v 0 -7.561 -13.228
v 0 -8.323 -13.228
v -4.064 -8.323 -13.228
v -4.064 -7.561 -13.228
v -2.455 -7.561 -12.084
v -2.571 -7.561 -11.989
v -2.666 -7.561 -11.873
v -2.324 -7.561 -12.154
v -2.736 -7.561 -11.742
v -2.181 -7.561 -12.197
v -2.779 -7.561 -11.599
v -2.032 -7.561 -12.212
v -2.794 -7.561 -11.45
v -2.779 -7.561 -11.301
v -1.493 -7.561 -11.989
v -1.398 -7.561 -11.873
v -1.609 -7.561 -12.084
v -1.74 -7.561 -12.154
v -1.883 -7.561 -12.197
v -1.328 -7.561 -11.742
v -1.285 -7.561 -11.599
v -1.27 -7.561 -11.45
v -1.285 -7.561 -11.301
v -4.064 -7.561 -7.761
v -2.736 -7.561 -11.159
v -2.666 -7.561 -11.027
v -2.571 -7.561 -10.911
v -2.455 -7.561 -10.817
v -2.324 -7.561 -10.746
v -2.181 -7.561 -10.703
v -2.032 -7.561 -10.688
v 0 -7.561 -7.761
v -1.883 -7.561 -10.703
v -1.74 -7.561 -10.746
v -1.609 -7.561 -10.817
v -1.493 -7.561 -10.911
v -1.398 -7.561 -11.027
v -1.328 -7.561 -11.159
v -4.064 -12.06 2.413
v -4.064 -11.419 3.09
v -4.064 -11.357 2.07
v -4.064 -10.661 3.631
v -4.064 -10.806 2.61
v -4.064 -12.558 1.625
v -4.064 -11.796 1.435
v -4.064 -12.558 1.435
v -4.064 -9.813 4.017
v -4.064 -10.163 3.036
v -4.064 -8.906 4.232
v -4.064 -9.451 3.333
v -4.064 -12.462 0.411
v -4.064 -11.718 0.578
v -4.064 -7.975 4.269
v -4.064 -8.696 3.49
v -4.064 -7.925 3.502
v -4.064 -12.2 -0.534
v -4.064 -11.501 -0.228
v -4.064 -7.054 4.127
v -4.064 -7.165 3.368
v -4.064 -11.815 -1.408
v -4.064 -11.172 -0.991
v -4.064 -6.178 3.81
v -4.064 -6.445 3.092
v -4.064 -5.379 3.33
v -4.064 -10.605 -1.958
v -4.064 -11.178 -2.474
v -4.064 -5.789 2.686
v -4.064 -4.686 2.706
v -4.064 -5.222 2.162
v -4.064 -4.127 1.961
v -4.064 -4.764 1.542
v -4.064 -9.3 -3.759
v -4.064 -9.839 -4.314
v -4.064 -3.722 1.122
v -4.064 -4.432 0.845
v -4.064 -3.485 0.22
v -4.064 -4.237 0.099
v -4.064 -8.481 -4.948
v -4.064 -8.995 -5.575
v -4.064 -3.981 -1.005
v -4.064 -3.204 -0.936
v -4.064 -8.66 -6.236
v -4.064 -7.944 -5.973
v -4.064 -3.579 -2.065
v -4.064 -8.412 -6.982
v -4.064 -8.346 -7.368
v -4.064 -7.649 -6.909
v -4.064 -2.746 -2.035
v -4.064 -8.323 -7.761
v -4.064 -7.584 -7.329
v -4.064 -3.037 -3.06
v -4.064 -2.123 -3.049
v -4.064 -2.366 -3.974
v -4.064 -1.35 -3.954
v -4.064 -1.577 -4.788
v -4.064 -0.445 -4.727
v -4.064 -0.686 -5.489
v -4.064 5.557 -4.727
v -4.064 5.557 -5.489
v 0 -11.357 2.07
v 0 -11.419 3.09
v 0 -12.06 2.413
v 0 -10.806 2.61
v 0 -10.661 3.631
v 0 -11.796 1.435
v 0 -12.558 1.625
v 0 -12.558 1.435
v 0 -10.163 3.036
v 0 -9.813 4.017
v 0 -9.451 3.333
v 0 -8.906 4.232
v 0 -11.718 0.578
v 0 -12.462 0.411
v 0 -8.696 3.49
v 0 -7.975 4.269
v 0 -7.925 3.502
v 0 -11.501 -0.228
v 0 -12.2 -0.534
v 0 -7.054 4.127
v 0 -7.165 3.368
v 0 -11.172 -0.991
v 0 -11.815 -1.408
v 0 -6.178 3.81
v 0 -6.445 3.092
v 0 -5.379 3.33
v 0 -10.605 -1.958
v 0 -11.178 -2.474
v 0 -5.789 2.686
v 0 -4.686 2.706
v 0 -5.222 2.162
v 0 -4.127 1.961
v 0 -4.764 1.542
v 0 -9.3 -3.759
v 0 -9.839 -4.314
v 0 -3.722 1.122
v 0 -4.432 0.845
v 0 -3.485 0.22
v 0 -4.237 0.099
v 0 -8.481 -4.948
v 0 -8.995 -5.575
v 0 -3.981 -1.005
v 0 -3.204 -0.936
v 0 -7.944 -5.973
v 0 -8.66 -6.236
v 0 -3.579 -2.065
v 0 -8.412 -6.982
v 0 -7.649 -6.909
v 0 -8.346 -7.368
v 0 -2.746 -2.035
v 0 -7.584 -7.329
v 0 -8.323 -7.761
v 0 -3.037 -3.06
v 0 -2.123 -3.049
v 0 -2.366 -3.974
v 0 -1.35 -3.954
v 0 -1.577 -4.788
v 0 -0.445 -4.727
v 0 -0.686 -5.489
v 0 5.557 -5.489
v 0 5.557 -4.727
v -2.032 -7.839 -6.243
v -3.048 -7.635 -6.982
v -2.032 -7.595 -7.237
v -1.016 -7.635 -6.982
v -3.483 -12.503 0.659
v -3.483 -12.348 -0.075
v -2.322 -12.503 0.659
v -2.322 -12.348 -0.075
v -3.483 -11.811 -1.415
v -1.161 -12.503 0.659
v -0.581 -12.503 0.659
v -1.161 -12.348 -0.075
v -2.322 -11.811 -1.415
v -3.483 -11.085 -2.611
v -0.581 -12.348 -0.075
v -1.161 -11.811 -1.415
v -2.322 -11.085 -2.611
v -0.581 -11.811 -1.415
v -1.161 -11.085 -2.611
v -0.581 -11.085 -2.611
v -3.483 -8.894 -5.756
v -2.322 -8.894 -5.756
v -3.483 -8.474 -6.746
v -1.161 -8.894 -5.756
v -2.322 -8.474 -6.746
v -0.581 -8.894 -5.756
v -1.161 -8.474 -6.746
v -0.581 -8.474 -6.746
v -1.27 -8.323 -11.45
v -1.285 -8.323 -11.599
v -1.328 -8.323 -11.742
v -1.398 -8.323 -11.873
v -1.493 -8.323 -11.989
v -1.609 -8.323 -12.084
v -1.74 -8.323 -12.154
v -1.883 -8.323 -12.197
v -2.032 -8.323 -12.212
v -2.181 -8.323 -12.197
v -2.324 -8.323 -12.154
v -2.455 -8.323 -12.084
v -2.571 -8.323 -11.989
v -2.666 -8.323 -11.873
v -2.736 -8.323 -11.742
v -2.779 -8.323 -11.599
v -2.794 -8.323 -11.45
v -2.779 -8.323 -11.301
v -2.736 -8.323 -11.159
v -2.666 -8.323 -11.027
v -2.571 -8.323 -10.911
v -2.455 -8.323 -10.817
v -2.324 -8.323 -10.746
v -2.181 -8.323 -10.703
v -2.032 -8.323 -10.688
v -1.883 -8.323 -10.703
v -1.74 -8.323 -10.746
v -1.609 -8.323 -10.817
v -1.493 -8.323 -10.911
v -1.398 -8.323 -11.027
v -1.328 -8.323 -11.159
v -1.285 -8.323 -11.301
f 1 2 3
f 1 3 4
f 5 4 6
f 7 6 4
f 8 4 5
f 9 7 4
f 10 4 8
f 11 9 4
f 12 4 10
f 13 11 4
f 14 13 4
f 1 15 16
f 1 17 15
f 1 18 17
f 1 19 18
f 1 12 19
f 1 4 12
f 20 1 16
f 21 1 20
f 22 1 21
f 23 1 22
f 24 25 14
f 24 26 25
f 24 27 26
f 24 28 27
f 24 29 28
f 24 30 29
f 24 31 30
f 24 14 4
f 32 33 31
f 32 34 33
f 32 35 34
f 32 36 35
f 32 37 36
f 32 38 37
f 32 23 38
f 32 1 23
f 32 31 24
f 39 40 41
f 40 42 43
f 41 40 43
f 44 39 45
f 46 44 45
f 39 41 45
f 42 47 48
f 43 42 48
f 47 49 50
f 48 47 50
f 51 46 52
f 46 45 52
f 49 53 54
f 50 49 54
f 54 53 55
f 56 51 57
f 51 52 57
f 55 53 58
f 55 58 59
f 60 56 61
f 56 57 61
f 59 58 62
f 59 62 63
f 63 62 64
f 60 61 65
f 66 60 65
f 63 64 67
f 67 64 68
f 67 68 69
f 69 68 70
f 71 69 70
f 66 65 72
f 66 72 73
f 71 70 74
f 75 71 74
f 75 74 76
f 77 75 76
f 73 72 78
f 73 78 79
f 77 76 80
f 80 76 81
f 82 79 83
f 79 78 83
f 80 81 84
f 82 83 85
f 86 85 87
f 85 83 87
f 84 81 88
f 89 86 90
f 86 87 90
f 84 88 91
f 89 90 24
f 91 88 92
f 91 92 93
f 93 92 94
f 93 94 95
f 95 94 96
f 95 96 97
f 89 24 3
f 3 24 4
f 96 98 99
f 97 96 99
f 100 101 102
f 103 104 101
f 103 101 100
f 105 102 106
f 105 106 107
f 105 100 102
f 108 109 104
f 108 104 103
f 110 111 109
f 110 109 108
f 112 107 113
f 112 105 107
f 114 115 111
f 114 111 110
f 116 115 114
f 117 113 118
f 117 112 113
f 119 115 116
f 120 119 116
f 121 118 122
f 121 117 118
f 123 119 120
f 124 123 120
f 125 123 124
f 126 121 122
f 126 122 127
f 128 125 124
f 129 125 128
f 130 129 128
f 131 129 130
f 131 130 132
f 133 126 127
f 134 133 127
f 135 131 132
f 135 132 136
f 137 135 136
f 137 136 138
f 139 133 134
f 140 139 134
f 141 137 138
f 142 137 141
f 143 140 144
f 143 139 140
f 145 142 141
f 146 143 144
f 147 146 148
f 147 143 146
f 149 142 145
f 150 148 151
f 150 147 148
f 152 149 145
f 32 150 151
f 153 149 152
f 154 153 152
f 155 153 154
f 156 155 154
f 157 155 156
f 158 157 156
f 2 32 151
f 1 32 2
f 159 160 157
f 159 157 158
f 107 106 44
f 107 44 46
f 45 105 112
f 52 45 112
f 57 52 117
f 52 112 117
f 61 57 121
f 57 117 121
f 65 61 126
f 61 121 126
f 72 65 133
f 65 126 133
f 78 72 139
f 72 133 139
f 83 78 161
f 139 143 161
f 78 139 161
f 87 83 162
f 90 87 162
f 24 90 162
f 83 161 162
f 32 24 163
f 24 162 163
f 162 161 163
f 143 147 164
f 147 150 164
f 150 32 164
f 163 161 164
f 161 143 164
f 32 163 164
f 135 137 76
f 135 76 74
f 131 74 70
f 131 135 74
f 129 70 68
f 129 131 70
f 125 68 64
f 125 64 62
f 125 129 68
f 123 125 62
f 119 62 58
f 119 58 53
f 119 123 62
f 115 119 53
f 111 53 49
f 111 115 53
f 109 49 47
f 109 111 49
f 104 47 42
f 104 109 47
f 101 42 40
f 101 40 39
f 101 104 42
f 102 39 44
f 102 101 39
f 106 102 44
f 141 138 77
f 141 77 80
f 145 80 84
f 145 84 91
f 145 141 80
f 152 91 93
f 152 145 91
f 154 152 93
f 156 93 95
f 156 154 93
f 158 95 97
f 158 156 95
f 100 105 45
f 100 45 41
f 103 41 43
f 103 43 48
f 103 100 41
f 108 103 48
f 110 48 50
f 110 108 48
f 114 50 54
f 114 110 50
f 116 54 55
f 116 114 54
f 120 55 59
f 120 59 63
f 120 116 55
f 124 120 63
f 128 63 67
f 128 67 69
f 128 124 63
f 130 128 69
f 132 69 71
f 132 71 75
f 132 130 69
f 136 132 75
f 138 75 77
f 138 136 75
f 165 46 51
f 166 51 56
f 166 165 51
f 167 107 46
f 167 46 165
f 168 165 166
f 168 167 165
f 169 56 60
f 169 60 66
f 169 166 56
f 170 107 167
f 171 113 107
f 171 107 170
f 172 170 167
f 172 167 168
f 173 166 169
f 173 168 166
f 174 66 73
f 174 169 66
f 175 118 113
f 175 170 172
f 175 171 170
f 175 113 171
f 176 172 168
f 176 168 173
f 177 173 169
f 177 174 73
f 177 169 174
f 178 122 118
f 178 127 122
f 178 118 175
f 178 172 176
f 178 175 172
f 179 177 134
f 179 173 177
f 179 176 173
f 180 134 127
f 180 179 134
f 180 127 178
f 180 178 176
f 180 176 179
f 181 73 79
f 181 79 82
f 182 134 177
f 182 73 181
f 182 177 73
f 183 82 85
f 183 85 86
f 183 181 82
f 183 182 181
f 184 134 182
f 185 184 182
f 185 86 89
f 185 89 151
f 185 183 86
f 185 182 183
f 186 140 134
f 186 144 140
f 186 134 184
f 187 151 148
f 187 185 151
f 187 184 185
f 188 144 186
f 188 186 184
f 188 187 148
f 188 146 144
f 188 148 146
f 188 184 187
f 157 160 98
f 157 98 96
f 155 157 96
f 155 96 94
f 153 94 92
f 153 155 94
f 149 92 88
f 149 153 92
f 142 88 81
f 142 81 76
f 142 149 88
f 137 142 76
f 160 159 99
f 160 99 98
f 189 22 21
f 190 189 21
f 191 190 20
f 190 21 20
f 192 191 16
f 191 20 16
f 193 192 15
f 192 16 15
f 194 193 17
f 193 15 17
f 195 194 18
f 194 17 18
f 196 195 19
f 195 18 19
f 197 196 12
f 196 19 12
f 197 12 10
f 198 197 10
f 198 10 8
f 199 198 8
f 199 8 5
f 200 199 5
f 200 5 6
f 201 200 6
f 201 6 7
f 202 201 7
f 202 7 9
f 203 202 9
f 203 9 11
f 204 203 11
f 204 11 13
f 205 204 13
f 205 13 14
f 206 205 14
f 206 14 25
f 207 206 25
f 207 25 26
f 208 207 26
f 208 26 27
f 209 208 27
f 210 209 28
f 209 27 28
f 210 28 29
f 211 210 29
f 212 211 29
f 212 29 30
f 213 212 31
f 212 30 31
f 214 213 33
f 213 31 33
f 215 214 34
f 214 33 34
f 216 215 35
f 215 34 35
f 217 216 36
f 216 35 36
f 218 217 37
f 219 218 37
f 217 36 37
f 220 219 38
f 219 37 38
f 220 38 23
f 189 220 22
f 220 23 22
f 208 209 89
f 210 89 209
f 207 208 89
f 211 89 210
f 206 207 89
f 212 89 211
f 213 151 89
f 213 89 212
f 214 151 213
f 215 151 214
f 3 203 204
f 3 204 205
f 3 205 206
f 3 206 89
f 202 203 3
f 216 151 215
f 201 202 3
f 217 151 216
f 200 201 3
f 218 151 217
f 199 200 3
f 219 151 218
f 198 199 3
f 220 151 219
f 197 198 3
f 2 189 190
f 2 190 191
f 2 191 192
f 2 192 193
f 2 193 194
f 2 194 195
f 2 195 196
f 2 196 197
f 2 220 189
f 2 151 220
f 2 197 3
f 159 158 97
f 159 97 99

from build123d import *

# Parameters (mm, degrees)
BOSS_EXTRUDE1_DEPTH = 4.064
SKETCH2_R           = 0.762
CUT_EXTRUDE1_DEPTH  = 5.996401933


with BuildPart() as part:
    # Sketch1 → Boss-Extrude1 (new body)
    with BuildSketch(Plane(origin=(0, 0, 0), x_dir=(0, 0, -1), z_dir=(1, 0, 0))):
        with BuildLine():
            Line((4.726865031, 5.556764983), (4.726865031, -0.444820699))
            ThreePointArc((4.726865031, -0.444820699), (2.554182799, -2.454658405), (-0.22039607, -3.485050462))
            ThreePointArc((-0.22039607, -3.485050462), (-4.22007249, -7.510942511), (-1.625042246, -12.557826332))
            Line((-1.625042246, -12.557826332), (-1.435472167, -12.557826332))
            add(Edge.make_bspline(
                [(-1.435472167, -12.557826332), (-1.175924208, -12.557849399), (-0.648911083, -12.519392405), (0.32614537, -12.308921718), (1.440239513, -11.841665003), (2.626862444, -11.096563597), (4.080334858, -10.011065793), (5.769221033, -8.746934213), (7.066078237, -8.323424357), (7.761067398, -8.323424519)],
                knots=[0, 0, 0, 0, 0.054765757, 0.109531513, 0.219063026, 0.328594539, 0.438126053, 0.657189079, 0.876252105, 0.876252105, 0.876252105, 0.876252105], degree=3))
            Line((7.761067398, -8.323424519), (13.22812784, -8.323424519))
            Line((13.22812784, -8.323424519), (13.22812784, -7.561424519))
            Line((13.22812784, -7.561424519), (7.761067576, -7.561424519))
            add(Edge.make_bspline(
                [(-1.435404445, -11.795826335), (1.654785659, -11.796100971), (4.006866827, -8.222316999), (7.226557461, -7.561424394), (7.761067576, -7.561424519)],
                knots=[0, 0, 0, 0, 0.739499728, 0.876252105, 0.876252105, 0.876252105, 0.876252105], degree=3))
            ThreePointArc((-1.435404445, -11.795826335), (-3.452810626, -7.541681499), (-0.098895233, -4.237301448))
            ThreePointArc((-0.098895233, -4.237301448), (3.060460139, -3.036798555), (5.488865031, -0.686142637))
            Line((5.488865031, -0.686142637), (5.488865031, 5.556764983))
            Line((5.488865031, 5.556764983), (4.726865031, 5.556764983))
        make_face()
    extrude(amount=-BOSS_EXTRUDE1_DEPTH)

    # Sketch2 → Cut-Extrude1 (cut, through all)
    with BuildSketch(Plane(origin=(0, -7.561424519, 0), x_dir=(1, 0, 0), z_dir=(0, 1, 0))):
        with Locations((-2.032, 11.45012784)):
            Circle(SKETCH2_R)
    extrude(amount=-CUT_EXTRUDE1_DEPTH, mode=Mode.SUBTRACT)


solid = part.part
